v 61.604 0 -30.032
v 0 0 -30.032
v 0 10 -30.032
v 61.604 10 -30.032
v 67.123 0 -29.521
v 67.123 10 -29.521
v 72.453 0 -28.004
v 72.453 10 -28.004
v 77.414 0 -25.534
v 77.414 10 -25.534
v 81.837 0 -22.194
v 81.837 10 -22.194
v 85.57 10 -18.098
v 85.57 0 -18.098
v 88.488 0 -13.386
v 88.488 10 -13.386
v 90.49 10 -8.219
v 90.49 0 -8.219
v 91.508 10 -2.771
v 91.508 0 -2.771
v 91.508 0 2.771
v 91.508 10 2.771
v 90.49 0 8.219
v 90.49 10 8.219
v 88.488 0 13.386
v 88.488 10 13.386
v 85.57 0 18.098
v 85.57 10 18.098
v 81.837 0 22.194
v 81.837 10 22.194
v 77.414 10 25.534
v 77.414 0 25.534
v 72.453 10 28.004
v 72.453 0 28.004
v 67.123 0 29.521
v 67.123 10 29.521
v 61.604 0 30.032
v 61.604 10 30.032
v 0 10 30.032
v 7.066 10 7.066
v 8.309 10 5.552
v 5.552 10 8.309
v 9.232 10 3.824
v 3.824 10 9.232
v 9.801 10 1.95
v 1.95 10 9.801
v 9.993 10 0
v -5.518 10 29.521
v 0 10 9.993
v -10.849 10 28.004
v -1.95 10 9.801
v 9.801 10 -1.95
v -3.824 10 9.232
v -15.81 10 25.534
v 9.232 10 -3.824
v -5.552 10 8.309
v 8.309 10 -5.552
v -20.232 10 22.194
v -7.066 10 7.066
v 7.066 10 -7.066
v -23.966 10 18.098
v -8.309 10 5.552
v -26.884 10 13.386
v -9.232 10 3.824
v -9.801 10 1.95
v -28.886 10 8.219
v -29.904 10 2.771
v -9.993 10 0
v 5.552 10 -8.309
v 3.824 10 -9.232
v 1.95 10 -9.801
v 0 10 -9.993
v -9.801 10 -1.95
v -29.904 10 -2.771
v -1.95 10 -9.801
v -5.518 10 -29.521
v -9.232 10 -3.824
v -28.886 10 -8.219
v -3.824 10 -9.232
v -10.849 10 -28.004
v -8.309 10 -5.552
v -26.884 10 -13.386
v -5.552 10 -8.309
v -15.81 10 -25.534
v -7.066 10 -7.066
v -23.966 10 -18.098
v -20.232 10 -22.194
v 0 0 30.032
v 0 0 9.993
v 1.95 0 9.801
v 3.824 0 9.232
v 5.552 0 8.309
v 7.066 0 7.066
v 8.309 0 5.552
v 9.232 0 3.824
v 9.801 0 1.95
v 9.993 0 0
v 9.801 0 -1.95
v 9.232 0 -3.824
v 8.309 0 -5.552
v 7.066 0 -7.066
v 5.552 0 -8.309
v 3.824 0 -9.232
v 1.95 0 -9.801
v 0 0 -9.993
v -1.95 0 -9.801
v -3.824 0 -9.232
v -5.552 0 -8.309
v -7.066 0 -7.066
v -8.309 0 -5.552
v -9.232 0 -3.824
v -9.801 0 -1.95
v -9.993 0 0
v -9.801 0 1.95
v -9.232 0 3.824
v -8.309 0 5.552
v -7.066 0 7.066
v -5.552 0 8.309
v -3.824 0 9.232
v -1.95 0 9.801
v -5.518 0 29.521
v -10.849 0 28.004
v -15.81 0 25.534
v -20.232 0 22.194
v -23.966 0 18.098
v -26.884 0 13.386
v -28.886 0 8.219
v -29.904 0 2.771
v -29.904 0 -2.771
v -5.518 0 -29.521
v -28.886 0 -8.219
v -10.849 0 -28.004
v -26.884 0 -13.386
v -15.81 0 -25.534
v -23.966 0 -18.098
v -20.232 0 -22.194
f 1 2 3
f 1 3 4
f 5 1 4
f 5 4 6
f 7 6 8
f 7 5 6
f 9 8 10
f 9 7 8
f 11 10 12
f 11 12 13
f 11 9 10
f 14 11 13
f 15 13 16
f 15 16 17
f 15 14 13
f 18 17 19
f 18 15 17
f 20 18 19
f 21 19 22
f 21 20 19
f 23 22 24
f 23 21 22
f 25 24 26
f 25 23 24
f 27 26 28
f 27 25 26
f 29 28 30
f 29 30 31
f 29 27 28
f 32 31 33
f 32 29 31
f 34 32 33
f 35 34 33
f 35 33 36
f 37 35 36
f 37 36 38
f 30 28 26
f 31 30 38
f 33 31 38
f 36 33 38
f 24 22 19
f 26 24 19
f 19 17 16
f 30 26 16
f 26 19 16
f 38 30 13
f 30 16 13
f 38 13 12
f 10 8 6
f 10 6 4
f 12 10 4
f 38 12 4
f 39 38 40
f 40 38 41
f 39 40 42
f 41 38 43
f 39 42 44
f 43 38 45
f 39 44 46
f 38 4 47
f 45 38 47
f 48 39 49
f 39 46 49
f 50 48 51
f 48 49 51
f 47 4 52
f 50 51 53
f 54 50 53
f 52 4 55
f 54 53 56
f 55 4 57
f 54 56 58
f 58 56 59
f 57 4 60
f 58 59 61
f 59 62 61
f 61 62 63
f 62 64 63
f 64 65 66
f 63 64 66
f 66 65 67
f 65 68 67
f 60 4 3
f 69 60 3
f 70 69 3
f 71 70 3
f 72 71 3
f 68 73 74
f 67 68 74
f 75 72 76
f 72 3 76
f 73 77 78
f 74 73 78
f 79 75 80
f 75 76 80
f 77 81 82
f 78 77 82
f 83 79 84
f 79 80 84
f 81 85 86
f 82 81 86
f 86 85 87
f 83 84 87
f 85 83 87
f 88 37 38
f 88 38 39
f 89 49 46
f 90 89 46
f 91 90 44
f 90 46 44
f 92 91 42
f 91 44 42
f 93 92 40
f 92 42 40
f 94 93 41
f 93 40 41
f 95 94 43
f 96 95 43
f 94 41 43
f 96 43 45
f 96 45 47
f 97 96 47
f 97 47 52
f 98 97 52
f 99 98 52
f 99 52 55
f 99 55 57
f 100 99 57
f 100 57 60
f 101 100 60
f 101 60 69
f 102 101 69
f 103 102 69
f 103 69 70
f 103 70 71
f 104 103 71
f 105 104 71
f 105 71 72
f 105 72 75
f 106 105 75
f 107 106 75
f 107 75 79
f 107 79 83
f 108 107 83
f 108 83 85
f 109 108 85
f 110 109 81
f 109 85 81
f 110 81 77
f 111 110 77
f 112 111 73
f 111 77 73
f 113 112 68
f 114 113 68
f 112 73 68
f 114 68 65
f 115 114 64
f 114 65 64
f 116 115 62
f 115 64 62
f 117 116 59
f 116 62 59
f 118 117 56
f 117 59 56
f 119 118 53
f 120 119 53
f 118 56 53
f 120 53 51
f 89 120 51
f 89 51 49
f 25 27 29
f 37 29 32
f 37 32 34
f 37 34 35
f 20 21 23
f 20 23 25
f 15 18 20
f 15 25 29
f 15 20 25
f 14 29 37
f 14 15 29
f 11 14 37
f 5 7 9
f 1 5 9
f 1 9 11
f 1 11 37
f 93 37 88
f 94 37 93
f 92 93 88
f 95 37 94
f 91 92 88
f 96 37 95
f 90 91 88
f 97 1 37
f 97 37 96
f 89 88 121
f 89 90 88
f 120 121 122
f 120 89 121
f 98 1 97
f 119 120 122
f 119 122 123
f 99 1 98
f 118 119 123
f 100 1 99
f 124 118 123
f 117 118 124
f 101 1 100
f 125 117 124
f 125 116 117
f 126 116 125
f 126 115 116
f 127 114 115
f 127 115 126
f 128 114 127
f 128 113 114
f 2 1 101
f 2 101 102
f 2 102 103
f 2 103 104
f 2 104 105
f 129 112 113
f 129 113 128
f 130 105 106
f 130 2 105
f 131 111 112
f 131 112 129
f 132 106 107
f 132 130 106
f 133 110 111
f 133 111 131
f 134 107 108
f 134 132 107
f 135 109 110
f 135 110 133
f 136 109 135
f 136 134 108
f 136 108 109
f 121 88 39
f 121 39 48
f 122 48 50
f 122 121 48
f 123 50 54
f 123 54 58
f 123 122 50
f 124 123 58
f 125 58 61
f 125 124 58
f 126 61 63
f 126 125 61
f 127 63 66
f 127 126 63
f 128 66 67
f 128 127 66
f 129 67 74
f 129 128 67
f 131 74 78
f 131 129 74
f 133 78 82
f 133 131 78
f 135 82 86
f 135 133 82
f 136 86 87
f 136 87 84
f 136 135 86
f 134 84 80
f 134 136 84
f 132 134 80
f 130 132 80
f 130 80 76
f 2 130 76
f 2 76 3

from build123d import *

# Parameters (mm, degrees)
DODANIE_WYCI_GNI_CIE1_DEPTH = 10
WYTNIJ_WYCI_GNI_CIE1_REACH  = 98.949
SZKIC2_R                    = 9.99307311


with BuildPart() as part:
    # Szkic1 → Dodanie-wyciągnięcie1 (new body)
    with BuildSketch(Plane(origin=(0, 0, 0), x_dir=(1, 0, 0), z_dir=(0, 1, 0))):
        with BuildLine():
            Line((0, 30.032086689), (61.604280389, 30.032086689))
            ThreePointArc((61.604280389, 30.032086689), (91.636367078, 0), (61.604280389, -30.032086689))
            Line((61.604280389, -30.032086689), (0, -30.032086689))
            ThreePointArc((0, -30.032086689), (-30.032086689, 0), (0, 30.032086689))
        make_face()
    extrude(amount=DODANIE_WYCI_GNI_CIE1_DEPTH)

    # Szkic2 → Wytnij-wyciągnięcie1 (cut, up to next)
    with BuildSketch(Plane(origin=(0, 10, 0), x_dir=(1, 0, 0), z_dir=(0, 1, 0)), mode=Mode.PRIVATE) as wytnij_wyci_gni_cie1_sk1:
        with Locations(Location((0, 0, 0), (0, 0, 270))):
            Circle(SZKIC2_R)
    wytnij_wyci_gni_cie1_tool1 = extrude(wytnij_wyci_gni_cie1_sk1.sketch, amount=-WYTNIJ_WYCI_GNI_CIE1_REACH, mode=Mode.PRIVATE) & part.part
    add(wytnij_wyci_gni_cie1_tool1.solids().sort_by_distance((0, 10, 0))[0], mode=Mode.SUBTRACT)


solid = part.part
